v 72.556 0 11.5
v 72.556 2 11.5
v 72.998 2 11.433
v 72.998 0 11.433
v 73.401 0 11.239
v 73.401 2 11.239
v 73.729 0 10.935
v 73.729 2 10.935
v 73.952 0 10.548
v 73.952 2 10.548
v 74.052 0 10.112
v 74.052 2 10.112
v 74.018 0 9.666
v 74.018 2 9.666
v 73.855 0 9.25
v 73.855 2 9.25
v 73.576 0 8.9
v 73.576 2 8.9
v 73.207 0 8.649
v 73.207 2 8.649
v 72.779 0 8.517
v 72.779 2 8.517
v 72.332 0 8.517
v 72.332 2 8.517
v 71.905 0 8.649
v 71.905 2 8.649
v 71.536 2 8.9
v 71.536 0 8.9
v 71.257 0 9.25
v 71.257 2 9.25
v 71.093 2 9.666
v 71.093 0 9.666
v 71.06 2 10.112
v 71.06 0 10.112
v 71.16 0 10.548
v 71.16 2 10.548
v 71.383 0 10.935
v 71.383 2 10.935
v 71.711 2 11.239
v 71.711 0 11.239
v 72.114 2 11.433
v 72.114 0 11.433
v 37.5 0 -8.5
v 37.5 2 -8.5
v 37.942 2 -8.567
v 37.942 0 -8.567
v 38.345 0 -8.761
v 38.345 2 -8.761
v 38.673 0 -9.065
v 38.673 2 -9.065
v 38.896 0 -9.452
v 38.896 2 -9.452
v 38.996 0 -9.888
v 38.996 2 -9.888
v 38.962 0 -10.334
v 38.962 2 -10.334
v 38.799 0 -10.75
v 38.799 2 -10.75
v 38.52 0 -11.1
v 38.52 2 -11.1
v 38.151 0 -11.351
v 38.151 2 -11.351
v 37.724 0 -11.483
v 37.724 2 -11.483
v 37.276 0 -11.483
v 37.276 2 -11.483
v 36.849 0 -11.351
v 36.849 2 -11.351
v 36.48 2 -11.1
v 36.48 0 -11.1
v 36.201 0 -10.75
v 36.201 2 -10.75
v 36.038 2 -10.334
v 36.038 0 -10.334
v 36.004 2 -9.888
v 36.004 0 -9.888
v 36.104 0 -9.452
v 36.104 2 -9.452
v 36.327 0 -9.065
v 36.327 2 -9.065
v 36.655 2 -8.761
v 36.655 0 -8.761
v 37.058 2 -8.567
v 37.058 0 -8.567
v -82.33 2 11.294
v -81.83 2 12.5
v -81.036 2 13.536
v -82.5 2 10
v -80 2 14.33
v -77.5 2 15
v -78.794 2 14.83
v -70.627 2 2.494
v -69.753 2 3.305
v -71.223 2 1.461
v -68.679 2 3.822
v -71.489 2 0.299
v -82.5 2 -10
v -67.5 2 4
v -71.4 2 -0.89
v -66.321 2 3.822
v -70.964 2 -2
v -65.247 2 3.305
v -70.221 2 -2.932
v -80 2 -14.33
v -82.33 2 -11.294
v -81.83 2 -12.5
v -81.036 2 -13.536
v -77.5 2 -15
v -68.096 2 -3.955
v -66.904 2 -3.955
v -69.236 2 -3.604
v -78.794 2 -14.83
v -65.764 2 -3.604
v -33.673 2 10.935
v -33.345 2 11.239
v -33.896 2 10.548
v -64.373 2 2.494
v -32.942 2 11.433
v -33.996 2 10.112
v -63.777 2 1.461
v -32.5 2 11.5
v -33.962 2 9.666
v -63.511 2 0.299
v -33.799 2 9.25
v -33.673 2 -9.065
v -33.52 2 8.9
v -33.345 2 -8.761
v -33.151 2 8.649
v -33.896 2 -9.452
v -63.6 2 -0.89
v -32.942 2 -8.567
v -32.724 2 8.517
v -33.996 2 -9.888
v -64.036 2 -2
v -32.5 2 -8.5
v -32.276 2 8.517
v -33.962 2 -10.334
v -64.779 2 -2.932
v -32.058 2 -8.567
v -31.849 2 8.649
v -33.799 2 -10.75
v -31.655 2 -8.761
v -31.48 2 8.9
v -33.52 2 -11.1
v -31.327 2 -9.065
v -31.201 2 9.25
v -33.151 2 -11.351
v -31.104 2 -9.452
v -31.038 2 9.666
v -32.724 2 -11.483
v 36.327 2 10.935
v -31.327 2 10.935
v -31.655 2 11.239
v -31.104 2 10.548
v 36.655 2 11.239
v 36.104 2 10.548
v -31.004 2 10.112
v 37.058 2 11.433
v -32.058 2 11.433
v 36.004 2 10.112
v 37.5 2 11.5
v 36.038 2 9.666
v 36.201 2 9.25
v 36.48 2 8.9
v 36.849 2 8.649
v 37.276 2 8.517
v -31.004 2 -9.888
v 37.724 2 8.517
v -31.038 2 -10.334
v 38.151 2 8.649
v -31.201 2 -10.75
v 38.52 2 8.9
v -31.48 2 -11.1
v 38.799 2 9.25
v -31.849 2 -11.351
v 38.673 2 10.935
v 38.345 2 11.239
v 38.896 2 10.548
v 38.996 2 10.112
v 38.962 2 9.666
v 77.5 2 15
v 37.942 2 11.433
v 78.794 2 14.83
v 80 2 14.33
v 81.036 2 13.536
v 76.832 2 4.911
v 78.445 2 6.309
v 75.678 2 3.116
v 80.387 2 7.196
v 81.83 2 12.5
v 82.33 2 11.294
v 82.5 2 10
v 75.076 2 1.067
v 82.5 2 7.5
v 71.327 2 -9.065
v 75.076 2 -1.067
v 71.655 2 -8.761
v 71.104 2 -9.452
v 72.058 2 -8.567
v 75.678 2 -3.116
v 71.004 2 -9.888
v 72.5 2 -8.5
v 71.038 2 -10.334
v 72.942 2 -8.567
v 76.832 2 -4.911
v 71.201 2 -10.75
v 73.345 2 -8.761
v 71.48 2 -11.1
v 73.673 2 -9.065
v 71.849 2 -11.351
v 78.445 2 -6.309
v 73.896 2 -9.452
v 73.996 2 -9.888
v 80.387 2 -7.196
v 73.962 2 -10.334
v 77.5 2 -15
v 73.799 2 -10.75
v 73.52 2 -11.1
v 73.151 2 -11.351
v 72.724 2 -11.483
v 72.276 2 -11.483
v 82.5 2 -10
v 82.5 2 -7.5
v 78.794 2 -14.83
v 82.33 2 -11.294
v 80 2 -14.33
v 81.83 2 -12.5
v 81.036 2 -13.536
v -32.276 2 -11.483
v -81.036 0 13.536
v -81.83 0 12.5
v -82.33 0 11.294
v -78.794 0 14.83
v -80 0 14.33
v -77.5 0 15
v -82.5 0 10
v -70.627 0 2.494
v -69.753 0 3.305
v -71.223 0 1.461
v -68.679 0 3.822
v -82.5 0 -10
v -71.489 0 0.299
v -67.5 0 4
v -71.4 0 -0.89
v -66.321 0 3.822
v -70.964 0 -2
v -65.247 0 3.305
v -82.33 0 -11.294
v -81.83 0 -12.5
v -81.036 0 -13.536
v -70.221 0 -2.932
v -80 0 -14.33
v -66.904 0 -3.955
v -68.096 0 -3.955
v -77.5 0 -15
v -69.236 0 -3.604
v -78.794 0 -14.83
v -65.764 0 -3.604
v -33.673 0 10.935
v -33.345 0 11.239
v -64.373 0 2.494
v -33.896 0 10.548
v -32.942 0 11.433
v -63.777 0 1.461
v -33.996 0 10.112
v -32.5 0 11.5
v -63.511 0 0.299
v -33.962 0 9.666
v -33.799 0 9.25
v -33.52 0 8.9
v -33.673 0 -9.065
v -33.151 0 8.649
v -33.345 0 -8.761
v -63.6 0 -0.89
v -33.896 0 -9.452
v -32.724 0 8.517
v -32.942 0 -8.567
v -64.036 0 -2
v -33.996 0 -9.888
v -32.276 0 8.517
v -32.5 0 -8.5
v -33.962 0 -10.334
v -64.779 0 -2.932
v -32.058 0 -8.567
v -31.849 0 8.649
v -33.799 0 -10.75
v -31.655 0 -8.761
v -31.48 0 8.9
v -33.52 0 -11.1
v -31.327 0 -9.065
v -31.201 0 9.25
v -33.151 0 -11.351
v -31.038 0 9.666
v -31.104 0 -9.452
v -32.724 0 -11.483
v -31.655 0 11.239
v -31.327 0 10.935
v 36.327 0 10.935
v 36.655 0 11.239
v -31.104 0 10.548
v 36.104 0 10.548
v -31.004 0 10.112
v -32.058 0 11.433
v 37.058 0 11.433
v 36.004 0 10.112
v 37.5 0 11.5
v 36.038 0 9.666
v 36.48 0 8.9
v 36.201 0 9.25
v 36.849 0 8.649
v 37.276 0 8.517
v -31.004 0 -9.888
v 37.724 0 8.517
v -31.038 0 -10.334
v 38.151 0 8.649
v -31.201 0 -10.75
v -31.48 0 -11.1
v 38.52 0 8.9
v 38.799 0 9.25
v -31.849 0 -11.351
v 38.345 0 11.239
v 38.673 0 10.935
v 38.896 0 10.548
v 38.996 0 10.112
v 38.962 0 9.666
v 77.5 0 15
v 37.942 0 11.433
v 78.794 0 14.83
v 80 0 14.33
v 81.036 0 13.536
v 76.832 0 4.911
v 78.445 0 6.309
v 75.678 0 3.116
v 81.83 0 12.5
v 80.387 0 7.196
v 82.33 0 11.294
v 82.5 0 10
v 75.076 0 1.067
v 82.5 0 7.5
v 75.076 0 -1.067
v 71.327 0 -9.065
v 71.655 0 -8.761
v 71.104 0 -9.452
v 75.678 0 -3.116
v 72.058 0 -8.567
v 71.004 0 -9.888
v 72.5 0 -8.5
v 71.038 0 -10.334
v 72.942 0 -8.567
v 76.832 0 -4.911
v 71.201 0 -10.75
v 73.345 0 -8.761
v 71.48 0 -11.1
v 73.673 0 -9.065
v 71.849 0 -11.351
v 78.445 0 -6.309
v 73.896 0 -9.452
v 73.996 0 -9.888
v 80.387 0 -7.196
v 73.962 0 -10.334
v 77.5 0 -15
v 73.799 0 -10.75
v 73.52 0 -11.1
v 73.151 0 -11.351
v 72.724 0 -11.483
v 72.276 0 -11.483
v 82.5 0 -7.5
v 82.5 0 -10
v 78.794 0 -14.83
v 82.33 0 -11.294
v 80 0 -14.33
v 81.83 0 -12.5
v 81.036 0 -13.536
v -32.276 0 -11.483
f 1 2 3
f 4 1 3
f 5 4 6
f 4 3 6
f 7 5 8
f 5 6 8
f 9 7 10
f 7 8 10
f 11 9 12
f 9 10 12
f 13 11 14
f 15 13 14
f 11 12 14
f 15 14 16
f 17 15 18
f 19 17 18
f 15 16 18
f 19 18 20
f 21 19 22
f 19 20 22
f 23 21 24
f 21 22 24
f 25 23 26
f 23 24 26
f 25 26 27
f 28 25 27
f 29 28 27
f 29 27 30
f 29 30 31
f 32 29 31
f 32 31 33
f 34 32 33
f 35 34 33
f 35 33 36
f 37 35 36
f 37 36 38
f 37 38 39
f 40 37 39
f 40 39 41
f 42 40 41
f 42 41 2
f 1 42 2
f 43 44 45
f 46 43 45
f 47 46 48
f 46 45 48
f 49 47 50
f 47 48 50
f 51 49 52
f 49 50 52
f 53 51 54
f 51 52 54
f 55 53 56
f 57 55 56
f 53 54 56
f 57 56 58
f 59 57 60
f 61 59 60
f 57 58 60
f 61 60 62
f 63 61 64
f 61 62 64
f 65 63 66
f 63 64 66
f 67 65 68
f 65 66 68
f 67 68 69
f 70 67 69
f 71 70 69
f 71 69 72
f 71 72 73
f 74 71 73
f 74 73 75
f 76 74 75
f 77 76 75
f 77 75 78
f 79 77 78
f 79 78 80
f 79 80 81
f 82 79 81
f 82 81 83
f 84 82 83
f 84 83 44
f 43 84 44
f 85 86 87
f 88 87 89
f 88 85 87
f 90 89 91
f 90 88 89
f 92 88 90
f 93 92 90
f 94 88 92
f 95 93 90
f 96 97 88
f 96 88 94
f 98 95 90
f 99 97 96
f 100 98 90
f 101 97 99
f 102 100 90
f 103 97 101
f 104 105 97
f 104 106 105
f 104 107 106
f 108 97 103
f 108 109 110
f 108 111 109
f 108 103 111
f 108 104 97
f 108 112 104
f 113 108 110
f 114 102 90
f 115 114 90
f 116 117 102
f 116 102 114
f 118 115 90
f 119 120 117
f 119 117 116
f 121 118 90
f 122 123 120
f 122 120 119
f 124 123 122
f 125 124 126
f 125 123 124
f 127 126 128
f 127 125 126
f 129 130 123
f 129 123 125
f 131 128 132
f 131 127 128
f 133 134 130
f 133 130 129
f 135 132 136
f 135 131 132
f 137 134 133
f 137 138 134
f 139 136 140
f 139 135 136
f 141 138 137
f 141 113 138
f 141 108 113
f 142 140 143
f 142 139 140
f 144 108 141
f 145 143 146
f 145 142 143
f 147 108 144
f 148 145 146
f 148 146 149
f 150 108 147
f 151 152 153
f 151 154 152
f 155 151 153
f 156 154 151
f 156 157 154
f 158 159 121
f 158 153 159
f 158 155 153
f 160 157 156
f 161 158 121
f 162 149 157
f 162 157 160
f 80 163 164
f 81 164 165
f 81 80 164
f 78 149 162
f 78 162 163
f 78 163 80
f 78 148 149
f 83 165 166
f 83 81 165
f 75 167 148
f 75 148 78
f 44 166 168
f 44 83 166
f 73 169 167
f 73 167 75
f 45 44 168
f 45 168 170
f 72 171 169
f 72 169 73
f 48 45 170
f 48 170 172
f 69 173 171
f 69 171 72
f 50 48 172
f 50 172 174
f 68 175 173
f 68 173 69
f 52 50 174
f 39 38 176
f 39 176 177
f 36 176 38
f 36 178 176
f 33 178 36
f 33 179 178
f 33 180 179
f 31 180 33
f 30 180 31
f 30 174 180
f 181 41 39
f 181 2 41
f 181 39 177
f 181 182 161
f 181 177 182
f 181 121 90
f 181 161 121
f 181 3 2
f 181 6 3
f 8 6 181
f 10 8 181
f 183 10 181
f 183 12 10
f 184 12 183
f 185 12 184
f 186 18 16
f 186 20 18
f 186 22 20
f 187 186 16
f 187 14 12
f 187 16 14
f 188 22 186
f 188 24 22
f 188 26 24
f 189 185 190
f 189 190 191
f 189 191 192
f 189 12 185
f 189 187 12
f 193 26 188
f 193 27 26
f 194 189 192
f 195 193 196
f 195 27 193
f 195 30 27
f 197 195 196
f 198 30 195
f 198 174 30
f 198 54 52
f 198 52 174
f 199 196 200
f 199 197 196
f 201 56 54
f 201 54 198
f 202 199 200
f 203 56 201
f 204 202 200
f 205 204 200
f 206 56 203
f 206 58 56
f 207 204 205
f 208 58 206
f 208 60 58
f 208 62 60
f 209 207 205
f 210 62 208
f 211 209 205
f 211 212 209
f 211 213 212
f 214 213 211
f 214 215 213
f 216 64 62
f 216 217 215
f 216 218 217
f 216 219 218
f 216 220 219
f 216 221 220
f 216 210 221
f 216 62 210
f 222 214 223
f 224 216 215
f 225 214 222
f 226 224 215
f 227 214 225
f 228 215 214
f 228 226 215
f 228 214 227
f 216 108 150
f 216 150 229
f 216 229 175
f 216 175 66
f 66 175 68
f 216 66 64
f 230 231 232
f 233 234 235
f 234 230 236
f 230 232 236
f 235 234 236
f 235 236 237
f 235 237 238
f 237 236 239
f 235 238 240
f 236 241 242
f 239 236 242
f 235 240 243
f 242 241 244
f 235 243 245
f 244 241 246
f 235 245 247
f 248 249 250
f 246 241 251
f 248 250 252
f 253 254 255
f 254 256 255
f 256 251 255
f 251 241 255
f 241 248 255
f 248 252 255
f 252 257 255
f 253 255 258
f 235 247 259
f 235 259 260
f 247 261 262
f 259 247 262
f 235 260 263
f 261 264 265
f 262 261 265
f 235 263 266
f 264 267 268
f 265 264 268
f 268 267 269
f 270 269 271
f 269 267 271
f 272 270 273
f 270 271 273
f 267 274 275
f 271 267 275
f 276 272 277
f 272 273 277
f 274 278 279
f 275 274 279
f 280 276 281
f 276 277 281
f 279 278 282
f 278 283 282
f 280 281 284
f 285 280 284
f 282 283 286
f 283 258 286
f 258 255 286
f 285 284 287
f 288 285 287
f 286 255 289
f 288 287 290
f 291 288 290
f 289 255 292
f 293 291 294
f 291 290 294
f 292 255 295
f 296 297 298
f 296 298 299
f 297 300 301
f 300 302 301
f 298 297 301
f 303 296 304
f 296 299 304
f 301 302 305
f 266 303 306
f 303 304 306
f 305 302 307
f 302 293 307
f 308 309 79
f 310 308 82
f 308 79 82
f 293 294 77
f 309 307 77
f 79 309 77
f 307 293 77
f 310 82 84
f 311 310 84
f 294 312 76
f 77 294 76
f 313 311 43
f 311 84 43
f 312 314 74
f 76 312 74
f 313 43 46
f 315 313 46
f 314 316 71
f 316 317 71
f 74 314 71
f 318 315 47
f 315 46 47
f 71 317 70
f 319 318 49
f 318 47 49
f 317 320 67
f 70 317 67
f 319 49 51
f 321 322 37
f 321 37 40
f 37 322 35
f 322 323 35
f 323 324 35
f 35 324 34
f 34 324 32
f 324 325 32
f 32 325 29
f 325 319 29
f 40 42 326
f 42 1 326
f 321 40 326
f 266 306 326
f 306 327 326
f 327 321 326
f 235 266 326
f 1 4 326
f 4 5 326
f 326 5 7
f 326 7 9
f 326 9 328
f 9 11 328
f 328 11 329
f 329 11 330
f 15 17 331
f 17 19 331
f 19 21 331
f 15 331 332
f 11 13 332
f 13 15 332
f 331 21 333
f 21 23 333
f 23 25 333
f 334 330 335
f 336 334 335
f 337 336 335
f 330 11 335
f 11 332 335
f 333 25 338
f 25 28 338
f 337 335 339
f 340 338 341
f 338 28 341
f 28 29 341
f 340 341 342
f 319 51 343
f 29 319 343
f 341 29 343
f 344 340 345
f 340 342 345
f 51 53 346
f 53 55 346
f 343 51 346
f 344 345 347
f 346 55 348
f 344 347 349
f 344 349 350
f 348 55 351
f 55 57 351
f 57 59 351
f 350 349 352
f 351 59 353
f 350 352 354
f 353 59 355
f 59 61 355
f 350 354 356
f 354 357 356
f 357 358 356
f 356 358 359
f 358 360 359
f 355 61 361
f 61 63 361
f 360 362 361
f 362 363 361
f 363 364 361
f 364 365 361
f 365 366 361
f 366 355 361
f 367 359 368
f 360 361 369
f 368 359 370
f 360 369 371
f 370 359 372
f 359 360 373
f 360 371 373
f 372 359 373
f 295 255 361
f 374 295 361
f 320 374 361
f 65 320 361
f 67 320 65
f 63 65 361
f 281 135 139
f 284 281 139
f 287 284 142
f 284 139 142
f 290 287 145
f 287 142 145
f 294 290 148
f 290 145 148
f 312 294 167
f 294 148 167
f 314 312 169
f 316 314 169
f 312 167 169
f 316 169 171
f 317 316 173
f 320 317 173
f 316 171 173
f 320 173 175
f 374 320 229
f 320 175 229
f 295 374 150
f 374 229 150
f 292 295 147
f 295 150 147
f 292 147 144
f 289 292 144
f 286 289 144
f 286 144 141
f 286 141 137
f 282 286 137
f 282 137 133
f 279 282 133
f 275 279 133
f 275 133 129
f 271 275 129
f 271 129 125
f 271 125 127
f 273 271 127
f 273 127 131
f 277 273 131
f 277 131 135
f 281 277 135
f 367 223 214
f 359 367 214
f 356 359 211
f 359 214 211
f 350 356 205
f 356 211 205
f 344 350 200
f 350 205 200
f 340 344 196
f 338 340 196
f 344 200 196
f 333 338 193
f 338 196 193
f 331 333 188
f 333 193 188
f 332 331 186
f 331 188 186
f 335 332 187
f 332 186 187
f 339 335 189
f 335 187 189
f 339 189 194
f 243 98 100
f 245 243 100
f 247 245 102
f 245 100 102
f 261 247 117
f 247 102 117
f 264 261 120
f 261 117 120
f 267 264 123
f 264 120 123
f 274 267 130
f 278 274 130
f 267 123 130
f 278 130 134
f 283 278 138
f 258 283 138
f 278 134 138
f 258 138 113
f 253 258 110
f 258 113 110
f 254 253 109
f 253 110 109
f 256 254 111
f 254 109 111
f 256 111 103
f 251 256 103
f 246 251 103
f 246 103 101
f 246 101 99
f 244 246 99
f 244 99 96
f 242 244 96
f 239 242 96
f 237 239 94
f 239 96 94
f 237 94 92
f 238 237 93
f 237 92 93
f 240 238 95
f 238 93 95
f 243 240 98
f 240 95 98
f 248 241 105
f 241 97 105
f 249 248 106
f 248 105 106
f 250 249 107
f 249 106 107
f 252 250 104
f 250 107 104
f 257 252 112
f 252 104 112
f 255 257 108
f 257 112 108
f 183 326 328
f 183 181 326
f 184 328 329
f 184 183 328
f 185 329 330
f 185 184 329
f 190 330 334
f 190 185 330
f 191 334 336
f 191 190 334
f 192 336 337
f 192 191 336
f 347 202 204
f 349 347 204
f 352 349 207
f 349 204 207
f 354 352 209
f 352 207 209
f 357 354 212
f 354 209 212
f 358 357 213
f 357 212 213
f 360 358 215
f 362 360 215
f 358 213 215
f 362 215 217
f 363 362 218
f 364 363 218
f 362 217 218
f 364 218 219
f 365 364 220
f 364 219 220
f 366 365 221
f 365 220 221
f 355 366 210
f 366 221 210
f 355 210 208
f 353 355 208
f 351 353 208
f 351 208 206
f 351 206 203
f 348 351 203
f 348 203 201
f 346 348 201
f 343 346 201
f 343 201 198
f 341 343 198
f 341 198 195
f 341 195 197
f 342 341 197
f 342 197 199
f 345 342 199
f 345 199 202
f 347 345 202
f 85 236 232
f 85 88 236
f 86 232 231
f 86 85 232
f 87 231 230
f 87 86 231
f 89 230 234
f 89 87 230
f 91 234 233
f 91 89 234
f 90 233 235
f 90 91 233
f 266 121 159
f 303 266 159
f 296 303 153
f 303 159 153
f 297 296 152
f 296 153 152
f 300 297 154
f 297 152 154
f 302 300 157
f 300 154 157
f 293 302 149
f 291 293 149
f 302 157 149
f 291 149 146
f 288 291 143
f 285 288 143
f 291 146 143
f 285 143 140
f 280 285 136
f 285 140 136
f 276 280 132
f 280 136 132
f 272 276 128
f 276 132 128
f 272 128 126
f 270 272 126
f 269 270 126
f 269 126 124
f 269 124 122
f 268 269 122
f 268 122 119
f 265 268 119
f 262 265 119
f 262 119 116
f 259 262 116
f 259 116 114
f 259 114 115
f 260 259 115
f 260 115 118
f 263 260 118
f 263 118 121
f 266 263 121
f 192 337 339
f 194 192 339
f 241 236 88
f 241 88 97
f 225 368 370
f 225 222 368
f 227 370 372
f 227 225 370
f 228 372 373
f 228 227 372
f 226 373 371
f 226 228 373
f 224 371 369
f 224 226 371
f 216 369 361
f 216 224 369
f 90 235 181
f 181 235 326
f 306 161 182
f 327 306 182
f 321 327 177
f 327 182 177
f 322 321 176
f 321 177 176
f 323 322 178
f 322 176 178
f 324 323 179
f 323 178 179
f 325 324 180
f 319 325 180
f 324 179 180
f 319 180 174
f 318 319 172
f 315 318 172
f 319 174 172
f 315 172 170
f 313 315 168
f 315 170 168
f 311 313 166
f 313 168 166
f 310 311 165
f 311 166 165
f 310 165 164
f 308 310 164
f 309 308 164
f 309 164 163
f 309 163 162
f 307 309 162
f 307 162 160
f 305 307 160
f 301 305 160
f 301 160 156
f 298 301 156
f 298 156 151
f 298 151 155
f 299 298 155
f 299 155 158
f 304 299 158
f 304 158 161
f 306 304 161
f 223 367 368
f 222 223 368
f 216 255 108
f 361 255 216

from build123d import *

# Parameters (mm, degrees)
SKETCH1_W           = 165
SKETCH1_H           = 30
BOSS_EXTRUDE1_DEPTH = 2
FILLET1_R           = 5
SKETCH3_R           = 4
CUT_EXTRUDE1_DEPTH  = 2
SKETCH4_R           = 7.5
CUT_EXTRUDE2_DEPTH  = 10
SKETCH5_R           = 1.5
CUT_EXTRUDE3_DEPTH  = 10
SKETCH6_R           = 1.5
CUT_EXTRUDE4_DEPTH  = 84.876397157


with BuildPart() as part:
    # Sketch1 → Boss-Extrude1 (new body)
    with BuildSketch(Plane(origin=(0, 0, 0), x_dir=(1, 0, 0), z_dir=(0, 1, 0))):
        Rectangle(SKETCH1_W, SKETCH1_H)
    extrude(amount=BOSS_EXTRUDE1_DEPTH)

    # Fillet1
    fillet1_edges = [part.edges().sort_by_distance(p)[0] for p in [
        (82.5, 1, 15),
        (-82.5, 1, 15),
        (-82.5, 1, -15),
        (82.5, 1, -15),
    ]]
    fillet(fillet1_edges, radius=FILLET1_R)

    # Sketch3 → Cut-Extrude1 (cut)
    with BuildSketch(Plane(origin=(0, 2, 0), x_dir=(1, 0, 0), z_dir=(0, 1, 0))):
        with Locations(Location((-67.5, 0, 0), (0, 0, 270))):
            Circle(SKETCH3_R)
    extrude(amount=-CUT_EXTRUDE1_DEPTH, mode=Mode.SUBTRACT)

    # Sketch4 → Cut-Extrude2 (cut)
    with BuildSketch(Plane(origin=(0, 2, 0), x_dir=(1, 0, 0), z_dir=(0, 1, 0))):
        with Locations((82.5, 0)):
            Circle(SKETCH4_R)
    extrude(amount=-CUT_EXTRUDE2_DEPTH, mode=Mode.SUBTRACT)

    # Sketch5 → Cut-Extrude3 (cut)
    with BuildSketch(Plane(origin=(0, 2, 0), x_dir=(1, 0, 0), z_dir=(0, 1, 0))):
        with Locations(Location((-32.5, 10, 0), (0, 0, 270))):
            Circle(SKETCH5_R)
        with Locations(Location((37.5, 10, 0), (0, 0, 270))):
            Circle(SKETCH5_R)
        with Locations(Location((-32.5, -10, 0), (0, 0, 270))):
            Circle(SKETCH5_R)
        with Locations(Location((37.5, -10, 0), (0, 0, 270))):
            Circle(SKETCH5_R)
    extrude(amount=-CUT_EXTRUDE3_DEPTH, mode=Mode.SUBTRACT)

    # Sketch6 → Cut-Extrude4 (cut, through all)
    with BuildSketch(Plane(origin=(0, 2, 0), x_dir=(1, 0, 0), z_dir=(0, 1, 0))):
        with Locations(Location((72.5, 10, 0), (0, 0, 270))):
            Circle(SKETCH6_R)
        with Locations(Location((72.555859106, -10, 0), (0, 0, 270))):
            Circle(SKETCH6_R)
    extrude(amount=-CUT_EXTRUDE4_DEPTH, mode=Mode.SUBTRACT)


solid = part.part
